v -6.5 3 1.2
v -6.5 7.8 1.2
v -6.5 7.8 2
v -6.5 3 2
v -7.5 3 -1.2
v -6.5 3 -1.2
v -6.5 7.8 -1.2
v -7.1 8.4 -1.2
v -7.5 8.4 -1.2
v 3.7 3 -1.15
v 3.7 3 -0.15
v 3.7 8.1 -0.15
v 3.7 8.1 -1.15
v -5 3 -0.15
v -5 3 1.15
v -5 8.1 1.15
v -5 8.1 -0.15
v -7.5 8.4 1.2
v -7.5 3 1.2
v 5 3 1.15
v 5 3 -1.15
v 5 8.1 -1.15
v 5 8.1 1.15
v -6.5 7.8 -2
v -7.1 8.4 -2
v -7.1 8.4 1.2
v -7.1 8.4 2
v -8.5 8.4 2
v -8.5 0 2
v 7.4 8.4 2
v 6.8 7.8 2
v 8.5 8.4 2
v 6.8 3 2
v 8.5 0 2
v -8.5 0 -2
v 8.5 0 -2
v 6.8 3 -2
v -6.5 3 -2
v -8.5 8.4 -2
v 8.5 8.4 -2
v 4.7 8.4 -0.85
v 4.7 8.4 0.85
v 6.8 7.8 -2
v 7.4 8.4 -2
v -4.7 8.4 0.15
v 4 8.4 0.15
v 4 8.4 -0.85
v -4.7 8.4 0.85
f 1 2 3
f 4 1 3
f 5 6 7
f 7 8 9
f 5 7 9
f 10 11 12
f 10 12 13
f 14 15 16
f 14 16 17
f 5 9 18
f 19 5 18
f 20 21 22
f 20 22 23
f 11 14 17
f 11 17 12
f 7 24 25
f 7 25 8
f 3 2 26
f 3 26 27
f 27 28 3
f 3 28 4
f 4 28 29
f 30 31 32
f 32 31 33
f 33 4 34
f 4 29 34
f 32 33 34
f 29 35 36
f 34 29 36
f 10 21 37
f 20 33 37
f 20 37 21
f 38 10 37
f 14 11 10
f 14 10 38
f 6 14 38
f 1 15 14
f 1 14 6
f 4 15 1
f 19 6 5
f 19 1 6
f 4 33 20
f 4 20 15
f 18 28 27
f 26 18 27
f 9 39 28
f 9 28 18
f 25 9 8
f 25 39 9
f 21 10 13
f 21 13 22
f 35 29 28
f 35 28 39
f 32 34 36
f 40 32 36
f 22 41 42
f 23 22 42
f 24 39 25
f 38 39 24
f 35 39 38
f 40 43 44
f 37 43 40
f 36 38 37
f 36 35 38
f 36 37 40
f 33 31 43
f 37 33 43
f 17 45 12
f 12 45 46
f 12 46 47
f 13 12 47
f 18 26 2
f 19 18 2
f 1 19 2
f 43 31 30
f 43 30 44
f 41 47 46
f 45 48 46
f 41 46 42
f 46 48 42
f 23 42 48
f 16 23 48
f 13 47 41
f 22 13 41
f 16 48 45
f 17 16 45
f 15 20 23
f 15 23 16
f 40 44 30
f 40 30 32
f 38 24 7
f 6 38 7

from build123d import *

# Parameters (mm, degrees)
CROQUIS1_W            = 17
CROQUIS1_H            = 4
EXTRUIR1_DEPTH        = 8.4
CORTAR_EXTRUIR1_DEPTH = 5.4
CHAFL_N1_SIZE         = 0.6
EXTRUIR2_DEPTH        = 5.4
CHAFL_N2_SIZE         = 0.3


with BuildPart() as part:
    # Croquis1 → Extruir1 (new body)
    with BuildSketch(Plane(origin=(0, 0, 0), x_dir=(1, 0, 0), z_dir=(0, 1, 0))):
        Rectangle(CROQUIS1_W, CROQUIS1_H)
    extrude(amount=EXTRUIR1_DEPTH)

    # Croquis2 → Cortar-Extruir1 (cut)
    with BuildSketch(Plane(origin=(0, 8.4, 0), x_dir=(-1, 0, 0), z_dir=(0, 1, 0))):
        Polygon((-6.8, -2), (6.5, -2), (6.5, -1.2), (7.5, -1.2), (7.5, 1.2), (6.5, 1.2), (6.5, 2), (-6.8, 2), align=None)
    extrude(amount=-CORTAR_EXTRUIR1_DEPTH, mode=Mode.SUBTRACT)

    # Chaflán1
    chafl_n1_edges = [part.edges().sort_by_distance(p)[0] for p in [
        (6.8, 8.4, 0),
        (-6.5, 8.4, -1.6),
        (-6.5, 8.4, 1.6),
    ]]
    chamfer(chafl_n1_edges, length=CHAFL_N1_SIZE)

    # Croquis3 → Extruir2 (add)
    with BuildSketch(Plane(origin=(0, 3, 0), x_dir=(-1, 0, 0), z_dir=(0, 1, 0))):
        Polygon((-5, -1.15), (-5, 1.15), (5, 1.15), (5, -0.15), (-3.7, -0.15), (-3.7, -1.15), align=None)
    extrude(amount=EXTRUIR2_DEPTH)

    # Chaflán2
    chafl_n2_edges = [part.edges().sort_by_distance(p)[0] for p in [
        (4.35, 8.4, -1.15),
        (3.7, 8.4, -0.65),
        (-0.65, 8.4, -0.15),
        (-5, 8.4, 0.5),
        (0, 8.4, 1.15),
        (5, 8.4, 0),
    ]]
    chamfer(chafl_n2_edges, length=CHAFL_N2_SIZE)


solid = part.part
